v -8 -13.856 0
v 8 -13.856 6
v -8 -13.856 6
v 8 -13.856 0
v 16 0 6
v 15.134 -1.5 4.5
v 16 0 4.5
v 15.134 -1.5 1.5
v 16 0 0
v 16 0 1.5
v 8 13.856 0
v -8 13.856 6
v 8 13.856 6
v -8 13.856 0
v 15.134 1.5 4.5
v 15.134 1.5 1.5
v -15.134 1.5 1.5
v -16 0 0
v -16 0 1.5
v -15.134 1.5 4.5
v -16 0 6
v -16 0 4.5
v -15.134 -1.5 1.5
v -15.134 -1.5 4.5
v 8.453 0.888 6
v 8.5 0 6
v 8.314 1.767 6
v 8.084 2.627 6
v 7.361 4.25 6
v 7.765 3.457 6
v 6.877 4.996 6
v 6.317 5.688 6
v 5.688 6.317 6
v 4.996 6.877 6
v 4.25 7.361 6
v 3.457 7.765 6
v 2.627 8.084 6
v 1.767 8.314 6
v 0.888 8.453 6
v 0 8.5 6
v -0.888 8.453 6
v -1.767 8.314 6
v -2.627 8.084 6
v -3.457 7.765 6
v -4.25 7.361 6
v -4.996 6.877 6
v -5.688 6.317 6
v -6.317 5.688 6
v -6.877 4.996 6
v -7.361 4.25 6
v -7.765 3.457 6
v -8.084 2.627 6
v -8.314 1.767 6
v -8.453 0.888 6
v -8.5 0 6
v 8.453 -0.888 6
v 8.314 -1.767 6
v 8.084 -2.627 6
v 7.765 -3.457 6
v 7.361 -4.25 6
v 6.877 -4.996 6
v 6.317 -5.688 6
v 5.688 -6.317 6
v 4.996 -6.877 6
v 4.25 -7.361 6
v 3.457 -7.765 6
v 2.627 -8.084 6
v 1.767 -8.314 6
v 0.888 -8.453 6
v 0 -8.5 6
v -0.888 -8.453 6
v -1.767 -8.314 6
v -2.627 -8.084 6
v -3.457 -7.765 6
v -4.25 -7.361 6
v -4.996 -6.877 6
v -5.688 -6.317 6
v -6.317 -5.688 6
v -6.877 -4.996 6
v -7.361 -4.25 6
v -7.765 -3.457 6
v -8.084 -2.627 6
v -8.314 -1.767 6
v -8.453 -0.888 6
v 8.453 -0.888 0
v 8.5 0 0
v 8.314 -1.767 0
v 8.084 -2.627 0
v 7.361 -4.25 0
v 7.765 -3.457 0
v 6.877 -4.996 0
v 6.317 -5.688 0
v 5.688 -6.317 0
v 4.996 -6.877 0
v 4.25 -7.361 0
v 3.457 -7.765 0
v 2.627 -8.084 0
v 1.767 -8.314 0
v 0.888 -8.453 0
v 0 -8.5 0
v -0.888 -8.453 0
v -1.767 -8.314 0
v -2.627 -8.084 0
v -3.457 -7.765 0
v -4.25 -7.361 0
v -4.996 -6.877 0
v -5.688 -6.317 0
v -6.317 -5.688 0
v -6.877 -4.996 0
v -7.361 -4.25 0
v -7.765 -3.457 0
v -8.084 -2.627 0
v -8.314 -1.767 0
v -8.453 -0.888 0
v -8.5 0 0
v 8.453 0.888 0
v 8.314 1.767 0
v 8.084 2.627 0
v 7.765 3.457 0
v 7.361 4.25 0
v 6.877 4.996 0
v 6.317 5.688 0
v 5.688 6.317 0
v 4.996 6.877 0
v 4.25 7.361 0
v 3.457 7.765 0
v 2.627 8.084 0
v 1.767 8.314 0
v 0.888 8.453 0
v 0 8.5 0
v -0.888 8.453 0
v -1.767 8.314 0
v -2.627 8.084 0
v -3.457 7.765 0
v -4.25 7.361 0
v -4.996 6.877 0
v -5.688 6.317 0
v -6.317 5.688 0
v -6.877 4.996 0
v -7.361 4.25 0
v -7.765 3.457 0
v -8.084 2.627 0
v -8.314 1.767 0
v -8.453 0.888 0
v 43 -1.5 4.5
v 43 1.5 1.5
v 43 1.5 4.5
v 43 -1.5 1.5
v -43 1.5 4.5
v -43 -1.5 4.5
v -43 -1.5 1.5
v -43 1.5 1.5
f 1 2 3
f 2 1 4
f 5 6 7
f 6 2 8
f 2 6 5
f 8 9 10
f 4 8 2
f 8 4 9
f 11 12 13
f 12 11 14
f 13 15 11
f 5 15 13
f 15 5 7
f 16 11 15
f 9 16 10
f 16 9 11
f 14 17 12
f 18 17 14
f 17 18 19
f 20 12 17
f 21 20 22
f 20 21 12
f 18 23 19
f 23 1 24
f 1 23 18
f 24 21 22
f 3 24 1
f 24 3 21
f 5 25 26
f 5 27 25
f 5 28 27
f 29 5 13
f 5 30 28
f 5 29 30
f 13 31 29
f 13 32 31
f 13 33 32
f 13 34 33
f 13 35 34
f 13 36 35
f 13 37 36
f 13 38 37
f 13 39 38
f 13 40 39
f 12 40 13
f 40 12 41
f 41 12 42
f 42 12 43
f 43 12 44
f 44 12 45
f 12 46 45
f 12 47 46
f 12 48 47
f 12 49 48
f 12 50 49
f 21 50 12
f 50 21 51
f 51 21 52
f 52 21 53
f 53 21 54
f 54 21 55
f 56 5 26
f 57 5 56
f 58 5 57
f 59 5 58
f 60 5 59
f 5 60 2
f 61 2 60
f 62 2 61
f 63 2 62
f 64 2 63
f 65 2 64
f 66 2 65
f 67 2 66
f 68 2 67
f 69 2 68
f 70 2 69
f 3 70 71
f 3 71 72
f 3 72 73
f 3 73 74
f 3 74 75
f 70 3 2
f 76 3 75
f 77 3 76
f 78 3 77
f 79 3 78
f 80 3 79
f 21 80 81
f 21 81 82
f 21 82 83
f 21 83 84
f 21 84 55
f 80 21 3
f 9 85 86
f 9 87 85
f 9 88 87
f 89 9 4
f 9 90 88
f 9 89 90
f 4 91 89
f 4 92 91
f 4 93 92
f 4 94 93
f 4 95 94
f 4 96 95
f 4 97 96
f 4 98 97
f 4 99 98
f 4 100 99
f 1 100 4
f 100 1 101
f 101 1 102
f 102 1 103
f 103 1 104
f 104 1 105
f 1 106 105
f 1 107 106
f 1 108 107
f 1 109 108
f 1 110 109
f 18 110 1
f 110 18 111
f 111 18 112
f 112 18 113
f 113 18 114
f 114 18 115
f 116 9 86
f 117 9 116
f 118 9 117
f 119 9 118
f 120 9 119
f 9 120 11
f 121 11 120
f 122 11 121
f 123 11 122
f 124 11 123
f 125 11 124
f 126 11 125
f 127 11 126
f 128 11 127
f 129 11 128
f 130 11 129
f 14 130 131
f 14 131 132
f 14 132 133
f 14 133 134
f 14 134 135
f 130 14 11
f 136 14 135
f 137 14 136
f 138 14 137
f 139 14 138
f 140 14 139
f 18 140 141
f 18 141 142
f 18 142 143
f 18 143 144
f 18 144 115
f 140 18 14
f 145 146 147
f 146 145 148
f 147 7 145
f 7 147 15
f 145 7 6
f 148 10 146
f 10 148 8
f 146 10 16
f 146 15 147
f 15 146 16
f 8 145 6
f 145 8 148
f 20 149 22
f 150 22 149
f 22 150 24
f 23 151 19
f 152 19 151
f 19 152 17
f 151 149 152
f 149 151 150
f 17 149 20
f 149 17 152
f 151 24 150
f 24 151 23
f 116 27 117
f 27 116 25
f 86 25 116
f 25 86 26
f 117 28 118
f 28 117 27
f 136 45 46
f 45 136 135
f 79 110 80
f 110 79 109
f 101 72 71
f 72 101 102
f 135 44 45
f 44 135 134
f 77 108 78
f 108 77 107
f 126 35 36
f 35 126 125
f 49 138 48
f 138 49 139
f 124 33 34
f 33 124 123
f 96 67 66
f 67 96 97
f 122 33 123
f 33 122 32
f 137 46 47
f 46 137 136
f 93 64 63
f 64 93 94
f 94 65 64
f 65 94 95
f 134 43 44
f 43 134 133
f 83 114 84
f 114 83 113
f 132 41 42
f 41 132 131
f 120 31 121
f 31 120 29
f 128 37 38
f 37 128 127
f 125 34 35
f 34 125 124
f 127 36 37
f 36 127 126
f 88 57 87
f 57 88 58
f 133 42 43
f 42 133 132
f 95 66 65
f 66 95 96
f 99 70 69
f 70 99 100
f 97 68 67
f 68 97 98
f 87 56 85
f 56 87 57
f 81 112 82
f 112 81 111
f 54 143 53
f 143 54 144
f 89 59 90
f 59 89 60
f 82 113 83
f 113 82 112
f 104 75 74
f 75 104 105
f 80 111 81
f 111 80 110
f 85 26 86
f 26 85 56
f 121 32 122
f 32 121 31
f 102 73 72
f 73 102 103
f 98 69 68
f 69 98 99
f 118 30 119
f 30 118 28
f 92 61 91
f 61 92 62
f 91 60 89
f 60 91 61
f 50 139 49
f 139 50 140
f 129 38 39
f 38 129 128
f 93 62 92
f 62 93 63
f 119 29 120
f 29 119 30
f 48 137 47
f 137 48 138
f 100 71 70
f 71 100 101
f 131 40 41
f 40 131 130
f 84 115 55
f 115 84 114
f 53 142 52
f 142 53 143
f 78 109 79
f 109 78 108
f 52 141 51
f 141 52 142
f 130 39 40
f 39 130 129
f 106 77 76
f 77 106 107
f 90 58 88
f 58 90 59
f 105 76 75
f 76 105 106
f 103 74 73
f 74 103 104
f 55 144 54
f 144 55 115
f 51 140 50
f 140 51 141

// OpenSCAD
// Wing nut with two reinforced wings.
$fn = 60;
eps = 0.02;
thread_d = 17;
body_d = 32;
body_h = 6;
wing_l = 28;
wing_t = 3;
difference() {
    union() {
        cylinder(d = body_d, h = body_h, $fn = 6);
        translate([body_d / 2 - 1, -wing_t / 2, body_h / 2 - wing_t / 2]) cube([wing_l, wing_t, wing_t]);
        translate([-body_d / 2 - wing_l + 1, -wing_t / 2, body_h / 2 - wing_t / 2]) cube([wing_l, wing_t, wing_t]);
    }
    translate([0, 0, -eps]) cylinder(d = thread_d, h = body_h + 2 * eps);
}
